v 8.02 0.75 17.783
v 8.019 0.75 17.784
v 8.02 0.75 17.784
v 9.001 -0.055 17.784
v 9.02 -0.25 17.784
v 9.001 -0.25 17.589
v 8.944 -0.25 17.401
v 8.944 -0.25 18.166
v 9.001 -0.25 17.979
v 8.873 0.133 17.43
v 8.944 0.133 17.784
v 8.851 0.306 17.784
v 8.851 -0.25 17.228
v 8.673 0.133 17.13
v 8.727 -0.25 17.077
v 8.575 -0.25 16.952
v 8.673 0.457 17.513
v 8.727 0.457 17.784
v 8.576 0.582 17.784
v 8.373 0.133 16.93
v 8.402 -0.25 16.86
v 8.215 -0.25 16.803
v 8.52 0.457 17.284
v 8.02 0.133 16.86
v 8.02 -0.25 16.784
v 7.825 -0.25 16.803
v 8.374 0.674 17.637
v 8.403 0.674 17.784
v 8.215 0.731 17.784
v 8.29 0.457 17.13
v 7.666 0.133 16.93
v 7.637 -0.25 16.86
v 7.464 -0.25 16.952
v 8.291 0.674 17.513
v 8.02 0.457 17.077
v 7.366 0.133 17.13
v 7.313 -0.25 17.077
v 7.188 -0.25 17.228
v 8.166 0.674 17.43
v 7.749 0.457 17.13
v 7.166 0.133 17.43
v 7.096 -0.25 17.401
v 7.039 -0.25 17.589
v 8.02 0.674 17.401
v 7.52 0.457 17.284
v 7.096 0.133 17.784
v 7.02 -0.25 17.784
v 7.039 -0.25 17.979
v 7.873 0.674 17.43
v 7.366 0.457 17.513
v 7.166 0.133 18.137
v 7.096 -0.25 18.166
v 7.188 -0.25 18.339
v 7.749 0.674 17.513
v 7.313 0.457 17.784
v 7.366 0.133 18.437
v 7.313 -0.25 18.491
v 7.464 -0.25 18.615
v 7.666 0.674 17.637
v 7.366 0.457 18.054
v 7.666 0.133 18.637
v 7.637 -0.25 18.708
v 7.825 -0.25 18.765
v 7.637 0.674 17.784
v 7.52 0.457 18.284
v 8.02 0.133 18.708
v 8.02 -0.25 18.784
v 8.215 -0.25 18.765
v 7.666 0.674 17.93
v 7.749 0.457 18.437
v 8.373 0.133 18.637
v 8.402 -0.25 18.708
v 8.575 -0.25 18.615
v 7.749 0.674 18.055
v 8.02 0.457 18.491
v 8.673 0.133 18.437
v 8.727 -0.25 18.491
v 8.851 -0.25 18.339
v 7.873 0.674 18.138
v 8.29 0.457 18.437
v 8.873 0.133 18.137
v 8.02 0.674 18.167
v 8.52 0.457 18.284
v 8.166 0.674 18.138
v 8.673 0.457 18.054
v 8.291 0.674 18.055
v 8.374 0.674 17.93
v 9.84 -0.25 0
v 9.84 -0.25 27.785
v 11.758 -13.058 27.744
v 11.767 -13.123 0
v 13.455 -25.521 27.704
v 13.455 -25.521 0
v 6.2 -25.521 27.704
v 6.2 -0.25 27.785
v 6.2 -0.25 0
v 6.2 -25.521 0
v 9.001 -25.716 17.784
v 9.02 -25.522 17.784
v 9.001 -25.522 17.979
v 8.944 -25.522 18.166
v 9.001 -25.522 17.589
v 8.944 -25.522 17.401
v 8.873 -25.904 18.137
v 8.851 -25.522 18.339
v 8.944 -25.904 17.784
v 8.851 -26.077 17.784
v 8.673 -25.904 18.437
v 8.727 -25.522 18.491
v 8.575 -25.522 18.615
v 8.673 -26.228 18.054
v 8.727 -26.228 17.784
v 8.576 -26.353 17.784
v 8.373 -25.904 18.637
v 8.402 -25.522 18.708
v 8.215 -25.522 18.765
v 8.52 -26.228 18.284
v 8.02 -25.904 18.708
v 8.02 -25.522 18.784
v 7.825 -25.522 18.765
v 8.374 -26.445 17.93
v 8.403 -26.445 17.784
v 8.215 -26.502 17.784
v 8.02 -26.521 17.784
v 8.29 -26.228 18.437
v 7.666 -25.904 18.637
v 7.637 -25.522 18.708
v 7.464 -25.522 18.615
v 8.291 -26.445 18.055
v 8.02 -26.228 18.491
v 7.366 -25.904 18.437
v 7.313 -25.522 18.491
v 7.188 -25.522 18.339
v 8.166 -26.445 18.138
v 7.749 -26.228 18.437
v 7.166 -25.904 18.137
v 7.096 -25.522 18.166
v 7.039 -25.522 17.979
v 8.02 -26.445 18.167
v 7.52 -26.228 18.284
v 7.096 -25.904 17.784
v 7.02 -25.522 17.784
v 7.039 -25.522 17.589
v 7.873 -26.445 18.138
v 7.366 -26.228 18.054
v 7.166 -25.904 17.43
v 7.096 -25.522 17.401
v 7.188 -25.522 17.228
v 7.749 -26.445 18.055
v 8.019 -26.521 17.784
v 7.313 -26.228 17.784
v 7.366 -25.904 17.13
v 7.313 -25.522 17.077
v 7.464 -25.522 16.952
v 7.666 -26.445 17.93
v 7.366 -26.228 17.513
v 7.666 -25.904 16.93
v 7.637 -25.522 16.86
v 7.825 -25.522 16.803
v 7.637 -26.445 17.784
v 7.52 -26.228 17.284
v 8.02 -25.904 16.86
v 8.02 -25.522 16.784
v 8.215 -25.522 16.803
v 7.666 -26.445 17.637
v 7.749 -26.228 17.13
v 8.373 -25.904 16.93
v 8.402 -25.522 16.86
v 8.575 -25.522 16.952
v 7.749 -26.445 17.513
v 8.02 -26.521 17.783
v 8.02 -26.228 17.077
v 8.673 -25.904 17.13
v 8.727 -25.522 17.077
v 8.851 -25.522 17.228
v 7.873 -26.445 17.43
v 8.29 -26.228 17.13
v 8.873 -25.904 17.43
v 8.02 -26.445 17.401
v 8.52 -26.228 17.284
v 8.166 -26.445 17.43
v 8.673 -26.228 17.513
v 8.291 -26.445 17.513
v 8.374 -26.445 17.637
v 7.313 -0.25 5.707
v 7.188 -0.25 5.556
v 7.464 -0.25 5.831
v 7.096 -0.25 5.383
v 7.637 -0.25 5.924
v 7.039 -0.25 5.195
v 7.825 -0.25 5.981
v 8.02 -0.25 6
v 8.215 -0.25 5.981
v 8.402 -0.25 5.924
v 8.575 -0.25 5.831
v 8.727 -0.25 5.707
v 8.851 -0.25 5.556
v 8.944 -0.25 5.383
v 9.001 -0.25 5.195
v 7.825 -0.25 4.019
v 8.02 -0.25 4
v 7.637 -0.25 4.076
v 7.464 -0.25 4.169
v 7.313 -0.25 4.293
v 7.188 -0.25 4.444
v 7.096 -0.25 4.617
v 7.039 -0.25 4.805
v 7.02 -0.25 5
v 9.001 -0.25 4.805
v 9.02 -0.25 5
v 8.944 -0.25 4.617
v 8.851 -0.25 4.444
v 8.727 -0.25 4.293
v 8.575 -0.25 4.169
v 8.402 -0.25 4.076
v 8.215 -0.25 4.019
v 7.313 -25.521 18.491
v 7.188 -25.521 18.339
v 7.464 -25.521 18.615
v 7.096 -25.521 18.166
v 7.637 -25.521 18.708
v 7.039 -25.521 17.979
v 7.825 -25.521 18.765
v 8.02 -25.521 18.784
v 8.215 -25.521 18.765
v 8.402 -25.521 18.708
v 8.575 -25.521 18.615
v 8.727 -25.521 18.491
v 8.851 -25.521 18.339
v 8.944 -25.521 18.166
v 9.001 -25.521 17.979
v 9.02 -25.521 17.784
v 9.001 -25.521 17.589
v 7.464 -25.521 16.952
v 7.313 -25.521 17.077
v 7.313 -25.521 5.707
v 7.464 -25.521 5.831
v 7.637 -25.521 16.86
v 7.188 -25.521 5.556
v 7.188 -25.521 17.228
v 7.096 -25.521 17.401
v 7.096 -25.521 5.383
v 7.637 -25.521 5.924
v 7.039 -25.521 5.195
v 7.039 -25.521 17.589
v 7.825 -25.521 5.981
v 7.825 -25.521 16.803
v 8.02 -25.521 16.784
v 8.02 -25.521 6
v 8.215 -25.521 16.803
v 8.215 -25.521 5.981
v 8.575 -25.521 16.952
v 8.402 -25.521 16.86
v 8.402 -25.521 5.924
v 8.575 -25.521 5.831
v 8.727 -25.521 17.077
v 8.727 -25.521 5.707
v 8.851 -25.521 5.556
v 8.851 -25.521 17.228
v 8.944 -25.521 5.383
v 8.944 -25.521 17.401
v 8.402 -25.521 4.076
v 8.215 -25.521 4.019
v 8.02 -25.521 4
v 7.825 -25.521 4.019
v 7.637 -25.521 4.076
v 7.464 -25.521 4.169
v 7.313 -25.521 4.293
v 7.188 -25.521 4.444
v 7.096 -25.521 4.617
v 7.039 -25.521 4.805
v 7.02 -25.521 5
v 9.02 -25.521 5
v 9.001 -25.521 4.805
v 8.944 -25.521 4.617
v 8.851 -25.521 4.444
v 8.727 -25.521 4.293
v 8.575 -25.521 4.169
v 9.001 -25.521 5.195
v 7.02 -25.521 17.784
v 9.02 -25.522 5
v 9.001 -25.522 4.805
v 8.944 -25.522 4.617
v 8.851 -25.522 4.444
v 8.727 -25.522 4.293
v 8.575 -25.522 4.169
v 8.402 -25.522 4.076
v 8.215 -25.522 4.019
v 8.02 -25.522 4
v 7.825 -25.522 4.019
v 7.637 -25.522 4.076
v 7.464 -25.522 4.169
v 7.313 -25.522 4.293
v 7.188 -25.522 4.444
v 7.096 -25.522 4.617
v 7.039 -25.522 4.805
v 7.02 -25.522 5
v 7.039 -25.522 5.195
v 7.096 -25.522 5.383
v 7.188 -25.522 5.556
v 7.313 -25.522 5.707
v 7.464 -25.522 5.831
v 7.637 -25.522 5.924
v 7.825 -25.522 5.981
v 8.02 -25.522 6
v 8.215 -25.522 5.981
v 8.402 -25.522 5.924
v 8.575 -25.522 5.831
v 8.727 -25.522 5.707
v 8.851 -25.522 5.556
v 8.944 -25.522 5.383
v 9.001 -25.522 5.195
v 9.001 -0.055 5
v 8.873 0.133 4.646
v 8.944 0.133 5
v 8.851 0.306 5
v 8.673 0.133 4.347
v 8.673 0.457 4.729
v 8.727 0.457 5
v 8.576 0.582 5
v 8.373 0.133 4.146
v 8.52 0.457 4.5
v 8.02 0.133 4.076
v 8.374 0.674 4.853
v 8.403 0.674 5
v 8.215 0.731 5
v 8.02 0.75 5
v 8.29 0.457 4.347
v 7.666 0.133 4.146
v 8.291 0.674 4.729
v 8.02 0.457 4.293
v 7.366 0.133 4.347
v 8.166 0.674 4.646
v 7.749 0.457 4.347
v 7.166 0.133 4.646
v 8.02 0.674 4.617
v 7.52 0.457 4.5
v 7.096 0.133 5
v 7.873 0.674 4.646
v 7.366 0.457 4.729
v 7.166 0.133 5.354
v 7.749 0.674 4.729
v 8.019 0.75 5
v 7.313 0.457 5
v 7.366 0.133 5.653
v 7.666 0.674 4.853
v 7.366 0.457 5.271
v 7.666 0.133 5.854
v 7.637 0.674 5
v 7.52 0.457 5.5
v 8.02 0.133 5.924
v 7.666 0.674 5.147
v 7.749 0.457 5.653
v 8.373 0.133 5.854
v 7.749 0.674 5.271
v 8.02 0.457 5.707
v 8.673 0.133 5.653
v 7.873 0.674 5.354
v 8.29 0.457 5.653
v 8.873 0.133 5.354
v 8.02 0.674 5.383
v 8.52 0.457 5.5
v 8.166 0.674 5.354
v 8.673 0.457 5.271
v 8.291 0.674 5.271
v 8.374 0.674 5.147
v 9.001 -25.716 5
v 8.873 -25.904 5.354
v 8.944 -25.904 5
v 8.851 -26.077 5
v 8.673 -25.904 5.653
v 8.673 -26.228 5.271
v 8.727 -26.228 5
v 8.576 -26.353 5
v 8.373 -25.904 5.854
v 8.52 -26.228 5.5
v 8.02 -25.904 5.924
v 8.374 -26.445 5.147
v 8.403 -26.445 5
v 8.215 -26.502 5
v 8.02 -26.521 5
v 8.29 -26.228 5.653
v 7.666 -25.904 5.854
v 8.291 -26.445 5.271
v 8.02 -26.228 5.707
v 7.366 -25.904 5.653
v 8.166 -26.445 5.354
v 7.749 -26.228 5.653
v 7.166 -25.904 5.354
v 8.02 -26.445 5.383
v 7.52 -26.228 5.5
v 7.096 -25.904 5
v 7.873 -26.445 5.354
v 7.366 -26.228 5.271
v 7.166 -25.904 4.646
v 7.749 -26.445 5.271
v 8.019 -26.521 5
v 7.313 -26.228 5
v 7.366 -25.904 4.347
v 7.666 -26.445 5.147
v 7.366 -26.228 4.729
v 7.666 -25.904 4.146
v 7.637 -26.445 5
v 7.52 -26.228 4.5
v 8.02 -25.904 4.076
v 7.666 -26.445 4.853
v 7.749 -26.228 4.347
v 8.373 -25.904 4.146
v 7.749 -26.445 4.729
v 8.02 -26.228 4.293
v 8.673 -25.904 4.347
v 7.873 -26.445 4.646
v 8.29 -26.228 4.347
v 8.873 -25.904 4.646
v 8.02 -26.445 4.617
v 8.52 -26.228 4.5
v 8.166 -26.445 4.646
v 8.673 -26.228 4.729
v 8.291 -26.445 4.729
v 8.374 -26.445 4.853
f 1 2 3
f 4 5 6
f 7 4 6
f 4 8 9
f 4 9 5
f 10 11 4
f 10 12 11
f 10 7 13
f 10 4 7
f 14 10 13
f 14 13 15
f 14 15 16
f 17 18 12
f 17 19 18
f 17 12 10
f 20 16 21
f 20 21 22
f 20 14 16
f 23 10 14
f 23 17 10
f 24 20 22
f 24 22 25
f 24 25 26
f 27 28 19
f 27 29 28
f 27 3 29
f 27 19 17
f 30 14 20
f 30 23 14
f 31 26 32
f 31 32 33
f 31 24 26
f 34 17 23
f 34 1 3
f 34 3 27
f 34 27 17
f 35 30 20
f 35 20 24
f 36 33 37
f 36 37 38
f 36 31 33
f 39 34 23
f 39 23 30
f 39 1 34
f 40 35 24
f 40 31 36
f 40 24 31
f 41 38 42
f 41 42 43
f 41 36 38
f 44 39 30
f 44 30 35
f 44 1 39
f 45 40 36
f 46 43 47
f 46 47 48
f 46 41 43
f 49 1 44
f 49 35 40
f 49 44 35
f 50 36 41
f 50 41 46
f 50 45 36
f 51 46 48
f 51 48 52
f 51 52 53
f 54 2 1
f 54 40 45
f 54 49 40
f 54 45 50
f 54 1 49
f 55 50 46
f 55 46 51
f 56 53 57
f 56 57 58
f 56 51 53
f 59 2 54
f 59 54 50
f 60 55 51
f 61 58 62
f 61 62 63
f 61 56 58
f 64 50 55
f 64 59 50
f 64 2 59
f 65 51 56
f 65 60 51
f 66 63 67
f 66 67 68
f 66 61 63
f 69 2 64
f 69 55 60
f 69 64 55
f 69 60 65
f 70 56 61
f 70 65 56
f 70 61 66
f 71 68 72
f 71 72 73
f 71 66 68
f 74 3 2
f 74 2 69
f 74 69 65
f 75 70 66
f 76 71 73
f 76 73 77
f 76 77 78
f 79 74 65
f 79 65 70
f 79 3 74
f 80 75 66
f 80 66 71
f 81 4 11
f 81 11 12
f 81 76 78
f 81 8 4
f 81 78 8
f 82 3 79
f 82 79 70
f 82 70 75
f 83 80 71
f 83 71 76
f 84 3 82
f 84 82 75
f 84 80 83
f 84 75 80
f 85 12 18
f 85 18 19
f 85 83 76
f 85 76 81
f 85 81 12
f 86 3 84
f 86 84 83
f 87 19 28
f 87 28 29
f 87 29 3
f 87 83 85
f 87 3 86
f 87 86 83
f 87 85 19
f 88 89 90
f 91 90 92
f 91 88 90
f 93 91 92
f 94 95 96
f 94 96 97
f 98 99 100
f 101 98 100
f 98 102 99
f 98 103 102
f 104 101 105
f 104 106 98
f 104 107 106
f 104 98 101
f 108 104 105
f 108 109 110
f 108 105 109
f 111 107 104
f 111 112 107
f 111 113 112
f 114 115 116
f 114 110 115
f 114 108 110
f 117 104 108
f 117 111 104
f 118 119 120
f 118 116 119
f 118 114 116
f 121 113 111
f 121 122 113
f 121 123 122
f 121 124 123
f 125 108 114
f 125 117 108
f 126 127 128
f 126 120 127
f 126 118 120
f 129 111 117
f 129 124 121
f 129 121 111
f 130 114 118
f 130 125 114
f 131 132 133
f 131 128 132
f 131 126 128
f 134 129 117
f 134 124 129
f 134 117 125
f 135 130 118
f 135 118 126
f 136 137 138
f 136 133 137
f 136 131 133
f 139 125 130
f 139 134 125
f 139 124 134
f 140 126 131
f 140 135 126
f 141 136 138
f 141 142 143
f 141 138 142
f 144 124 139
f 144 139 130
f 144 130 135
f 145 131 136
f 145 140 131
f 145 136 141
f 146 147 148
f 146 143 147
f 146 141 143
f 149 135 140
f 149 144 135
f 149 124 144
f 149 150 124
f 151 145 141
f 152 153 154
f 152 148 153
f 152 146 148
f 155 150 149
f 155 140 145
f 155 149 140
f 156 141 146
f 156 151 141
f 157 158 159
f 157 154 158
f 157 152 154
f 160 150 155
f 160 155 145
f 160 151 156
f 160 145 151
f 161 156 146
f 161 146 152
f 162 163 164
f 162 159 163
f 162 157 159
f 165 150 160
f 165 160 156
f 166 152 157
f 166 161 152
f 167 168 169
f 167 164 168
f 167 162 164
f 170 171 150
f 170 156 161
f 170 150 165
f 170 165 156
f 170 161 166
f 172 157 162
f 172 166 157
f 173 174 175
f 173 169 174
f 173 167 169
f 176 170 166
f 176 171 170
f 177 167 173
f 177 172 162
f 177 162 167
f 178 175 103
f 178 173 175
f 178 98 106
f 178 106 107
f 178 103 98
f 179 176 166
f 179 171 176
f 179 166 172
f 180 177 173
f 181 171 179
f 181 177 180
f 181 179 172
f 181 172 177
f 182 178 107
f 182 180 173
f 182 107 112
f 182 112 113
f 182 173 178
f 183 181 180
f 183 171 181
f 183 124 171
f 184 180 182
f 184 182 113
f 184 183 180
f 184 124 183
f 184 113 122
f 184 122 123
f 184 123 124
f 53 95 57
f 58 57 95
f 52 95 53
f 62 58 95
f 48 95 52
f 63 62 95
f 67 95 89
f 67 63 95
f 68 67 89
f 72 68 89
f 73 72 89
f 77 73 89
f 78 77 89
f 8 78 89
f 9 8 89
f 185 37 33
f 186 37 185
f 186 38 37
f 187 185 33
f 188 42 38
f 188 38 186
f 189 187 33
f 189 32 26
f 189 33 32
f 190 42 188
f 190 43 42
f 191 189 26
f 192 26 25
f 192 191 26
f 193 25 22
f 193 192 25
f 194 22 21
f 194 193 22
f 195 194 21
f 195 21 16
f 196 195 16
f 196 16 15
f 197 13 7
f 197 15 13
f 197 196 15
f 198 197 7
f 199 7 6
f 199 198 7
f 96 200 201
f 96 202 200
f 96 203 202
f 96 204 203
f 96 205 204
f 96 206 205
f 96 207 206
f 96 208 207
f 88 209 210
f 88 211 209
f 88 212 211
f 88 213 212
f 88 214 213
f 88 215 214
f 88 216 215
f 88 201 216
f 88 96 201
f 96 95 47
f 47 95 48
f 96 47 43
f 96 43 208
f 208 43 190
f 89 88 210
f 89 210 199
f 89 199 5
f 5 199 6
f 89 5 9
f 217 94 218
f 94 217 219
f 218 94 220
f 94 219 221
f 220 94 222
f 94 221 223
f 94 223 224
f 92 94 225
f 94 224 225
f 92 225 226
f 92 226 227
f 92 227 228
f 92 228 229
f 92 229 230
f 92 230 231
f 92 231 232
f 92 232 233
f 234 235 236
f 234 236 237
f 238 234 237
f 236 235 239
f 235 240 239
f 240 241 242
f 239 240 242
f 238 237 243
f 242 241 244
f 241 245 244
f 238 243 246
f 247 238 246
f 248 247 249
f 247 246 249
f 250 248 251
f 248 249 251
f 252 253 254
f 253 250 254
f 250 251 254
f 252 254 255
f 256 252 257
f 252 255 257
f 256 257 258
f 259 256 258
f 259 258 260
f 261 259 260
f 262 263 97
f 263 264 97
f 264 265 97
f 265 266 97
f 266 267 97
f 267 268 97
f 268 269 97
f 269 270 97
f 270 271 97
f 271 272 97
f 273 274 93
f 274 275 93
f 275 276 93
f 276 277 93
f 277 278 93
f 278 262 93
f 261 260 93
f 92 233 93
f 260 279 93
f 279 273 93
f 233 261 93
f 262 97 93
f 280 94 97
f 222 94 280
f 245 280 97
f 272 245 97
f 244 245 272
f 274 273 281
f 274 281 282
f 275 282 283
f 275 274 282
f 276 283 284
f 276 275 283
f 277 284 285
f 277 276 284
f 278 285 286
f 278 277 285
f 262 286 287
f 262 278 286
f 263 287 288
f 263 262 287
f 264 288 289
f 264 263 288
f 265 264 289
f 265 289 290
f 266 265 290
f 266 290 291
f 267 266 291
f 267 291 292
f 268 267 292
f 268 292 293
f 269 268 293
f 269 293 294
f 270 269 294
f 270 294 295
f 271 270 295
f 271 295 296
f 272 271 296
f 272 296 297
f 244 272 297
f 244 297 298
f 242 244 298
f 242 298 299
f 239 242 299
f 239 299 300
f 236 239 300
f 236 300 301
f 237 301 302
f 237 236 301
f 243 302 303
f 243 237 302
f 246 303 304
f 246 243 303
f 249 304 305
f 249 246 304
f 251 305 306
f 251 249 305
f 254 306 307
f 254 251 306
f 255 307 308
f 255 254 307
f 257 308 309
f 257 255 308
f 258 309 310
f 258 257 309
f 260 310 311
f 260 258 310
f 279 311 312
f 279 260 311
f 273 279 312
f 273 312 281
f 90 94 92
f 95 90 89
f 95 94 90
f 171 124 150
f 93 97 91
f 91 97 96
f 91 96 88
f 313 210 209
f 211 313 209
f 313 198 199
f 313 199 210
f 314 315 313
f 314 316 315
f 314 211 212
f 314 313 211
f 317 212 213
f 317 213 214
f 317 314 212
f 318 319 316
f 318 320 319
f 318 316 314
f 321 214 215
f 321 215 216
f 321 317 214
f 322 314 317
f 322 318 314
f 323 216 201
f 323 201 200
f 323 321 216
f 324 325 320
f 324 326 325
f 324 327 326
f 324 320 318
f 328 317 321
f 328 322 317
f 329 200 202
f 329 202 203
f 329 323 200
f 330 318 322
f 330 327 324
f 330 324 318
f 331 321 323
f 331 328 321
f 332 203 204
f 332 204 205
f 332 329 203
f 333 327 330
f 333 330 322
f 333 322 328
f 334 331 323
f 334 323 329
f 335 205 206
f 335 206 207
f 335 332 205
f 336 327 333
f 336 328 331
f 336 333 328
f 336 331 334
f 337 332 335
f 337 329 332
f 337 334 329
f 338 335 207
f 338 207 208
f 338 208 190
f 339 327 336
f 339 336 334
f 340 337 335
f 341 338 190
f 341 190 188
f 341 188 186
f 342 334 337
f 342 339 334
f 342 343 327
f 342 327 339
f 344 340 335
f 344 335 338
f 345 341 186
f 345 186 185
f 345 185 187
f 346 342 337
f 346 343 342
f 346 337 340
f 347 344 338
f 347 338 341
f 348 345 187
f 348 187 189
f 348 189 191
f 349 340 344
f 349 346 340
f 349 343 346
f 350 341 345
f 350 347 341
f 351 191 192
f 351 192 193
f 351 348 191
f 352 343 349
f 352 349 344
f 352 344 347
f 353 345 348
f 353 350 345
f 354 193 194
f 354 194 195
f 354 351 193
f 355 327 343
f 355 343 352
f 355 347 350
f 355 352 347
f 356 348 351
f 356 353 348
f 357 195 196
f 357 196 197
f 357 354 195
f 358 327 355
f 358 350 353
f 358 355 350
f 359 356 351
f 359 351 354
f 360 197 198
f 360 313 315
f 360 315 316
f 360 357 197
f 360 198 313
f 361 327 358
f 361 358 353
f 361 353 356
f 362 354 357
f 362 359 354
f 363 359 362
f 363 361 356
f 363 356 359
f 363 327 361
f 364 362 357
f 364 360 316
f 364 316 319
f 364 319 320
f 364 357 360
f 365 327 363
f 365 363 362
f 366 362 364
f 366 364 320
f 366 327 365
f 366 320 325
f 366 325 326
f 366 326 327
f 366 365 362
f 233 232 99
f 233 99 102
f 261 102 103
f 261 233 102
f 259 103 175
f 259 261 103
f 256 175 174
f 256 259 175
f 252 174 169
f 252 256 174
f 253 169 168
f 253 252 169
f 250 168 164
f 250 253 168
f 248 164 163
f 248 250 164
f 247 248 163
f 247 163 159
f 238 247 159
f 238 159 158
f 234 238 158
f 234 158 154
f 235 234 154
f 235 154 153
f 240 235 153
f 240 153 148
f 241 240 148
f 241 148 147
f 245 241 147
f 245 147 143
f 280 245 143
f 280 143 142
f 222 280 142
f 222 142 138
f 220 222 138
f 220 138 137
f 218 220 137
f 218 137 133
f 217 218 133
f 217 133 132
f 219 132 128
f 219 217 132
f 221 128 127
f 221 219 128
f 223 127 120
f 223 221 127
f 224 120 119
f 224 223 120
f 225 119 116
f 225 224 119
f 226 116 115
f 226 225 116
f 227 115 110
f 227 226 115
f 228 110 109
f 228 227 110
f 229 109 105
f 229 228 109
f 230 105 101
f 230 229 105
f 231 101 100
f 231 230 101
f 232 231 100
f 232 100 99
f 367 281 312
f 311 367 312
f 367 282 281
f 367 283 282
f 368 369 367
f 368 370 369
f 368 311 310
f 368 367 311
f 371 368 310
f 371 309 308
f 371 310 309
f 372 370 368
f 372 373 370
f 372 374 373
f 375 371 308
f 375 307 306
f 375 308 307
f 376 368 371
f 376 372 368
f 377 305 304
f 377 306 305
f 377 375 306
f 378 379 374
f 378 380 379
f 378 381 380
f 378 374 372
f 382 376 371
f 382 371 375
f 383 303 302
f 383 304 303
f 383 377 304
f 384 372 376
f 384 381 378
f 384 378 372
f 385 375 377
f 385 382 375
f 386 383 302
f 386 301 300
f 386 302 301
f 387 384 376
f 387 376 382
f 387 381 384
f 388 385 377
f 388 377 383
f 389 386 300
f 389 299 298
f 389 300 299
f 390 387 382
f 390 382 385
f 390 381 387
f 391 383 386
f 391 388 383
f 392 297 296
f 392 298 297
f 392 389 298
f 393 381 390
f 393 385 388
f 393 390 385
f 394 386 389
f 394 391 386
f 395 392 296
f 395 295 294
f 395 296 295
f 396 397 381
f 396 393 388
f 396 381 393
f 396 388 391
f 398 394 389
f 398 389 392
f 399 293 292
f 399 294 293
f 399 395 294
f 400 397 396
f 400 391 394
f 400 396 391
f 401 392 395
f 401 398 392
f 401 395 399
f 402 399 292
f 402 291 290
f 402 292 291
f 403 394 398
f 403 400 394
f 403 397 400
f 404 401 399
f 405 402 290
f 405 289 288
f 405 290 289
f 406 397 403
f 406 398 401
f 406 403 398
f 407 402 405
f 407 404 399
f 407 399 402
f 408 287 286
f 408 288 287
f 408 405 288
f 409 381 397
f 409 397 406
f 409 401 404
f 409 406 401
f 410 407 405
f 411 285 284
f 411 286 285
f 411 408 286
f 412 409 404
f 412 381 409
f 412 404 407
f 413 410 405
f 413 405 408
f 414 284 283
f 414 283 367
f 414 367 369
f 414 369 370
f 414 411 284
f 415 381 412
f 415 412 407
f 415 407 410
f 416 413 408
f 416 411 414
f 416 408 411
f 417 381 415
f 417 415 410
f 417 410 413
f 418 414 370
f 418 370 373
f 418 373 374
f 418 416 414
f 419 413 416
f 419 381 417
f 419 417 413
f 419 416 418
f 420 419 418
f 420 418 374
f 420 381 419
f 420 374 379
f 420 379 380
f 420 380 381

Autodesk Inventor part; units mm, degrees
ref_plane "YZ Plane" through (0, 0, 0) normal (1, 0, 0) x (0, 1, 0)
ref_plane "Work Plane1" through (0, 0, 0) normal (0, 0, 1) x (1, 0, 0)
sketch "Sketch1" plane through (0, 0, 0) normal (0, 0, 1) x (1, 0, 0)
  spline S0 degree 3 poles (0.756, 49.6264) (0.8045, 49.3961) (1.4299, 46.4448) (3.02, 38.5419) (3.7417, 34.8308) (6.1255, 22.1808) (7.7131, 13.0519) (12.377, -15.9979) (15.3565, -38.2776) (18.0982, -72.579) (18.7462, -87.3982) (17.8341, -109.2065) (16.9191, -121.3453) (13.1344, -135.1445) (11.7229, -139.4741) (8.6906, -144.8131) (7.5566, -146.4347) (5.361, -148.5489) (4.4031, -149.2519) (2.172, -150.2514) (1.1579, -150.3736) (0.378, -150.3736) knots -21.570573 -21.570573 -21.570573 -21.570573 -20.133907 -20.133907 -18.864962 -18.864962 -15.766925 -15.766925 -8.908038 -8.908038 -4.28709 -4.28709 -1.655649 -1.655649 -0.852769 -0.852769 -0.490947 -0.490947 -0.258162 -0.258162 0 0 0 0 projected
  line L0 (13.2039, -25.771) -> (-6.8, -25.771) projected
  line L1 (-6.8, 0) -> (9.8005, 0) projected
  line L2 (5.2, -2.2181) -> (5.2, 1.2819) projected
  line L3 (6.2, 0) -> (6.2, -25.771)
  line L4 (6.2, -0.25) -> (9.8396, -0.25)
  line L5 (6.2, -25.521) -> (13.4551, -25.521)
  circle A0 centre (8.0198, -0.25) radius 1
  circle A1 centre (8.0783, -25.521) radius 1
  circle A2 centre (8.0198, -0.25) radius 1
  circle A3 centre (8.0783, -25.521) radius 1
  point P0 (0, 0)
  point P1 (9.0783, -25.521)
  point P2 (9.0198, -0.25)
  point P3 (7.0198, -0.25)
  point P4 (7.0783, -25.521)
  dimension "d0" = 1
  dimension "d1" = 0.25
  dimension "d2" = 0.25
  dimension "d3" = 2
  dimension "d4" = 2
ref_plane "Work Plane2" through (-6.6501, -24.5518, 27.7072) normal (0, -0.0032, 1) x (1, 0, 0)
ref_plane "Work Plane3" through (-6.6501, -24.5518, 27.7072) normal (0, -0.0032, 1) x (1, 0, 0)
extrude "Extrusion1" add sketch "Sketch1" along normal up to surface contours S0 L5 A1 L3 L4 A0 | A0 L4 | L5 A1 surface through (-6.6501, -24.5518, 27.7072) normal (0, -0.0032, 1)
ref_plane "Work Plane4" through (0, 0, 80) normal (0, 0, 1) x (1, 0, 0)
sketch "Sketch3" plane through (6.2, -0.25, 0) normal (0, 1, 0) x (1, 0, 0)
  circle A0 centre (1.8198, -5) radius 1
  circle A1 centre (1.8198, -17.7838) radius 1
  line L0 (0, -27.7838) -> (3.6396, -27.7838) projected
  line L1 (3.6396, 0) -> (0, 0) projected
  point P0 (-6.2, 0)
  point P1 (1.8198, -27.7838)
  point P2 (1.8198, 0)
  dimension "d10" = 2
  dimension "d11" = 2
  dimension "d13" = 10
  dimension "d14" = 5
extrude "Extrusion3" add sketch "Sketch3" along normal blind 1
fillet "Fillet1" radius 1 2 edges at (7.0198, 0.75, 5) (7.0198, 0.75, 17.7838)
ref_plane "Work Plane5" through (6.2, -12.8855, 0) normal (0, 1, 0) x (1, 0, 0)
mirror "Mirror2" about plane through (6.2, -12.8855, 0) normal (0, 1, 0) of "Extrusion3"
fillet "Fillet2" radius 1 2 edges at (7.0198, -26.521, 17.7838) (7.0198, -26.521, 5)
ref_plane "Work Plane6" through (0, 0, 792.194) normal (0, 0, 1) x (1, 0, 0)
properties part number "servo cap"
